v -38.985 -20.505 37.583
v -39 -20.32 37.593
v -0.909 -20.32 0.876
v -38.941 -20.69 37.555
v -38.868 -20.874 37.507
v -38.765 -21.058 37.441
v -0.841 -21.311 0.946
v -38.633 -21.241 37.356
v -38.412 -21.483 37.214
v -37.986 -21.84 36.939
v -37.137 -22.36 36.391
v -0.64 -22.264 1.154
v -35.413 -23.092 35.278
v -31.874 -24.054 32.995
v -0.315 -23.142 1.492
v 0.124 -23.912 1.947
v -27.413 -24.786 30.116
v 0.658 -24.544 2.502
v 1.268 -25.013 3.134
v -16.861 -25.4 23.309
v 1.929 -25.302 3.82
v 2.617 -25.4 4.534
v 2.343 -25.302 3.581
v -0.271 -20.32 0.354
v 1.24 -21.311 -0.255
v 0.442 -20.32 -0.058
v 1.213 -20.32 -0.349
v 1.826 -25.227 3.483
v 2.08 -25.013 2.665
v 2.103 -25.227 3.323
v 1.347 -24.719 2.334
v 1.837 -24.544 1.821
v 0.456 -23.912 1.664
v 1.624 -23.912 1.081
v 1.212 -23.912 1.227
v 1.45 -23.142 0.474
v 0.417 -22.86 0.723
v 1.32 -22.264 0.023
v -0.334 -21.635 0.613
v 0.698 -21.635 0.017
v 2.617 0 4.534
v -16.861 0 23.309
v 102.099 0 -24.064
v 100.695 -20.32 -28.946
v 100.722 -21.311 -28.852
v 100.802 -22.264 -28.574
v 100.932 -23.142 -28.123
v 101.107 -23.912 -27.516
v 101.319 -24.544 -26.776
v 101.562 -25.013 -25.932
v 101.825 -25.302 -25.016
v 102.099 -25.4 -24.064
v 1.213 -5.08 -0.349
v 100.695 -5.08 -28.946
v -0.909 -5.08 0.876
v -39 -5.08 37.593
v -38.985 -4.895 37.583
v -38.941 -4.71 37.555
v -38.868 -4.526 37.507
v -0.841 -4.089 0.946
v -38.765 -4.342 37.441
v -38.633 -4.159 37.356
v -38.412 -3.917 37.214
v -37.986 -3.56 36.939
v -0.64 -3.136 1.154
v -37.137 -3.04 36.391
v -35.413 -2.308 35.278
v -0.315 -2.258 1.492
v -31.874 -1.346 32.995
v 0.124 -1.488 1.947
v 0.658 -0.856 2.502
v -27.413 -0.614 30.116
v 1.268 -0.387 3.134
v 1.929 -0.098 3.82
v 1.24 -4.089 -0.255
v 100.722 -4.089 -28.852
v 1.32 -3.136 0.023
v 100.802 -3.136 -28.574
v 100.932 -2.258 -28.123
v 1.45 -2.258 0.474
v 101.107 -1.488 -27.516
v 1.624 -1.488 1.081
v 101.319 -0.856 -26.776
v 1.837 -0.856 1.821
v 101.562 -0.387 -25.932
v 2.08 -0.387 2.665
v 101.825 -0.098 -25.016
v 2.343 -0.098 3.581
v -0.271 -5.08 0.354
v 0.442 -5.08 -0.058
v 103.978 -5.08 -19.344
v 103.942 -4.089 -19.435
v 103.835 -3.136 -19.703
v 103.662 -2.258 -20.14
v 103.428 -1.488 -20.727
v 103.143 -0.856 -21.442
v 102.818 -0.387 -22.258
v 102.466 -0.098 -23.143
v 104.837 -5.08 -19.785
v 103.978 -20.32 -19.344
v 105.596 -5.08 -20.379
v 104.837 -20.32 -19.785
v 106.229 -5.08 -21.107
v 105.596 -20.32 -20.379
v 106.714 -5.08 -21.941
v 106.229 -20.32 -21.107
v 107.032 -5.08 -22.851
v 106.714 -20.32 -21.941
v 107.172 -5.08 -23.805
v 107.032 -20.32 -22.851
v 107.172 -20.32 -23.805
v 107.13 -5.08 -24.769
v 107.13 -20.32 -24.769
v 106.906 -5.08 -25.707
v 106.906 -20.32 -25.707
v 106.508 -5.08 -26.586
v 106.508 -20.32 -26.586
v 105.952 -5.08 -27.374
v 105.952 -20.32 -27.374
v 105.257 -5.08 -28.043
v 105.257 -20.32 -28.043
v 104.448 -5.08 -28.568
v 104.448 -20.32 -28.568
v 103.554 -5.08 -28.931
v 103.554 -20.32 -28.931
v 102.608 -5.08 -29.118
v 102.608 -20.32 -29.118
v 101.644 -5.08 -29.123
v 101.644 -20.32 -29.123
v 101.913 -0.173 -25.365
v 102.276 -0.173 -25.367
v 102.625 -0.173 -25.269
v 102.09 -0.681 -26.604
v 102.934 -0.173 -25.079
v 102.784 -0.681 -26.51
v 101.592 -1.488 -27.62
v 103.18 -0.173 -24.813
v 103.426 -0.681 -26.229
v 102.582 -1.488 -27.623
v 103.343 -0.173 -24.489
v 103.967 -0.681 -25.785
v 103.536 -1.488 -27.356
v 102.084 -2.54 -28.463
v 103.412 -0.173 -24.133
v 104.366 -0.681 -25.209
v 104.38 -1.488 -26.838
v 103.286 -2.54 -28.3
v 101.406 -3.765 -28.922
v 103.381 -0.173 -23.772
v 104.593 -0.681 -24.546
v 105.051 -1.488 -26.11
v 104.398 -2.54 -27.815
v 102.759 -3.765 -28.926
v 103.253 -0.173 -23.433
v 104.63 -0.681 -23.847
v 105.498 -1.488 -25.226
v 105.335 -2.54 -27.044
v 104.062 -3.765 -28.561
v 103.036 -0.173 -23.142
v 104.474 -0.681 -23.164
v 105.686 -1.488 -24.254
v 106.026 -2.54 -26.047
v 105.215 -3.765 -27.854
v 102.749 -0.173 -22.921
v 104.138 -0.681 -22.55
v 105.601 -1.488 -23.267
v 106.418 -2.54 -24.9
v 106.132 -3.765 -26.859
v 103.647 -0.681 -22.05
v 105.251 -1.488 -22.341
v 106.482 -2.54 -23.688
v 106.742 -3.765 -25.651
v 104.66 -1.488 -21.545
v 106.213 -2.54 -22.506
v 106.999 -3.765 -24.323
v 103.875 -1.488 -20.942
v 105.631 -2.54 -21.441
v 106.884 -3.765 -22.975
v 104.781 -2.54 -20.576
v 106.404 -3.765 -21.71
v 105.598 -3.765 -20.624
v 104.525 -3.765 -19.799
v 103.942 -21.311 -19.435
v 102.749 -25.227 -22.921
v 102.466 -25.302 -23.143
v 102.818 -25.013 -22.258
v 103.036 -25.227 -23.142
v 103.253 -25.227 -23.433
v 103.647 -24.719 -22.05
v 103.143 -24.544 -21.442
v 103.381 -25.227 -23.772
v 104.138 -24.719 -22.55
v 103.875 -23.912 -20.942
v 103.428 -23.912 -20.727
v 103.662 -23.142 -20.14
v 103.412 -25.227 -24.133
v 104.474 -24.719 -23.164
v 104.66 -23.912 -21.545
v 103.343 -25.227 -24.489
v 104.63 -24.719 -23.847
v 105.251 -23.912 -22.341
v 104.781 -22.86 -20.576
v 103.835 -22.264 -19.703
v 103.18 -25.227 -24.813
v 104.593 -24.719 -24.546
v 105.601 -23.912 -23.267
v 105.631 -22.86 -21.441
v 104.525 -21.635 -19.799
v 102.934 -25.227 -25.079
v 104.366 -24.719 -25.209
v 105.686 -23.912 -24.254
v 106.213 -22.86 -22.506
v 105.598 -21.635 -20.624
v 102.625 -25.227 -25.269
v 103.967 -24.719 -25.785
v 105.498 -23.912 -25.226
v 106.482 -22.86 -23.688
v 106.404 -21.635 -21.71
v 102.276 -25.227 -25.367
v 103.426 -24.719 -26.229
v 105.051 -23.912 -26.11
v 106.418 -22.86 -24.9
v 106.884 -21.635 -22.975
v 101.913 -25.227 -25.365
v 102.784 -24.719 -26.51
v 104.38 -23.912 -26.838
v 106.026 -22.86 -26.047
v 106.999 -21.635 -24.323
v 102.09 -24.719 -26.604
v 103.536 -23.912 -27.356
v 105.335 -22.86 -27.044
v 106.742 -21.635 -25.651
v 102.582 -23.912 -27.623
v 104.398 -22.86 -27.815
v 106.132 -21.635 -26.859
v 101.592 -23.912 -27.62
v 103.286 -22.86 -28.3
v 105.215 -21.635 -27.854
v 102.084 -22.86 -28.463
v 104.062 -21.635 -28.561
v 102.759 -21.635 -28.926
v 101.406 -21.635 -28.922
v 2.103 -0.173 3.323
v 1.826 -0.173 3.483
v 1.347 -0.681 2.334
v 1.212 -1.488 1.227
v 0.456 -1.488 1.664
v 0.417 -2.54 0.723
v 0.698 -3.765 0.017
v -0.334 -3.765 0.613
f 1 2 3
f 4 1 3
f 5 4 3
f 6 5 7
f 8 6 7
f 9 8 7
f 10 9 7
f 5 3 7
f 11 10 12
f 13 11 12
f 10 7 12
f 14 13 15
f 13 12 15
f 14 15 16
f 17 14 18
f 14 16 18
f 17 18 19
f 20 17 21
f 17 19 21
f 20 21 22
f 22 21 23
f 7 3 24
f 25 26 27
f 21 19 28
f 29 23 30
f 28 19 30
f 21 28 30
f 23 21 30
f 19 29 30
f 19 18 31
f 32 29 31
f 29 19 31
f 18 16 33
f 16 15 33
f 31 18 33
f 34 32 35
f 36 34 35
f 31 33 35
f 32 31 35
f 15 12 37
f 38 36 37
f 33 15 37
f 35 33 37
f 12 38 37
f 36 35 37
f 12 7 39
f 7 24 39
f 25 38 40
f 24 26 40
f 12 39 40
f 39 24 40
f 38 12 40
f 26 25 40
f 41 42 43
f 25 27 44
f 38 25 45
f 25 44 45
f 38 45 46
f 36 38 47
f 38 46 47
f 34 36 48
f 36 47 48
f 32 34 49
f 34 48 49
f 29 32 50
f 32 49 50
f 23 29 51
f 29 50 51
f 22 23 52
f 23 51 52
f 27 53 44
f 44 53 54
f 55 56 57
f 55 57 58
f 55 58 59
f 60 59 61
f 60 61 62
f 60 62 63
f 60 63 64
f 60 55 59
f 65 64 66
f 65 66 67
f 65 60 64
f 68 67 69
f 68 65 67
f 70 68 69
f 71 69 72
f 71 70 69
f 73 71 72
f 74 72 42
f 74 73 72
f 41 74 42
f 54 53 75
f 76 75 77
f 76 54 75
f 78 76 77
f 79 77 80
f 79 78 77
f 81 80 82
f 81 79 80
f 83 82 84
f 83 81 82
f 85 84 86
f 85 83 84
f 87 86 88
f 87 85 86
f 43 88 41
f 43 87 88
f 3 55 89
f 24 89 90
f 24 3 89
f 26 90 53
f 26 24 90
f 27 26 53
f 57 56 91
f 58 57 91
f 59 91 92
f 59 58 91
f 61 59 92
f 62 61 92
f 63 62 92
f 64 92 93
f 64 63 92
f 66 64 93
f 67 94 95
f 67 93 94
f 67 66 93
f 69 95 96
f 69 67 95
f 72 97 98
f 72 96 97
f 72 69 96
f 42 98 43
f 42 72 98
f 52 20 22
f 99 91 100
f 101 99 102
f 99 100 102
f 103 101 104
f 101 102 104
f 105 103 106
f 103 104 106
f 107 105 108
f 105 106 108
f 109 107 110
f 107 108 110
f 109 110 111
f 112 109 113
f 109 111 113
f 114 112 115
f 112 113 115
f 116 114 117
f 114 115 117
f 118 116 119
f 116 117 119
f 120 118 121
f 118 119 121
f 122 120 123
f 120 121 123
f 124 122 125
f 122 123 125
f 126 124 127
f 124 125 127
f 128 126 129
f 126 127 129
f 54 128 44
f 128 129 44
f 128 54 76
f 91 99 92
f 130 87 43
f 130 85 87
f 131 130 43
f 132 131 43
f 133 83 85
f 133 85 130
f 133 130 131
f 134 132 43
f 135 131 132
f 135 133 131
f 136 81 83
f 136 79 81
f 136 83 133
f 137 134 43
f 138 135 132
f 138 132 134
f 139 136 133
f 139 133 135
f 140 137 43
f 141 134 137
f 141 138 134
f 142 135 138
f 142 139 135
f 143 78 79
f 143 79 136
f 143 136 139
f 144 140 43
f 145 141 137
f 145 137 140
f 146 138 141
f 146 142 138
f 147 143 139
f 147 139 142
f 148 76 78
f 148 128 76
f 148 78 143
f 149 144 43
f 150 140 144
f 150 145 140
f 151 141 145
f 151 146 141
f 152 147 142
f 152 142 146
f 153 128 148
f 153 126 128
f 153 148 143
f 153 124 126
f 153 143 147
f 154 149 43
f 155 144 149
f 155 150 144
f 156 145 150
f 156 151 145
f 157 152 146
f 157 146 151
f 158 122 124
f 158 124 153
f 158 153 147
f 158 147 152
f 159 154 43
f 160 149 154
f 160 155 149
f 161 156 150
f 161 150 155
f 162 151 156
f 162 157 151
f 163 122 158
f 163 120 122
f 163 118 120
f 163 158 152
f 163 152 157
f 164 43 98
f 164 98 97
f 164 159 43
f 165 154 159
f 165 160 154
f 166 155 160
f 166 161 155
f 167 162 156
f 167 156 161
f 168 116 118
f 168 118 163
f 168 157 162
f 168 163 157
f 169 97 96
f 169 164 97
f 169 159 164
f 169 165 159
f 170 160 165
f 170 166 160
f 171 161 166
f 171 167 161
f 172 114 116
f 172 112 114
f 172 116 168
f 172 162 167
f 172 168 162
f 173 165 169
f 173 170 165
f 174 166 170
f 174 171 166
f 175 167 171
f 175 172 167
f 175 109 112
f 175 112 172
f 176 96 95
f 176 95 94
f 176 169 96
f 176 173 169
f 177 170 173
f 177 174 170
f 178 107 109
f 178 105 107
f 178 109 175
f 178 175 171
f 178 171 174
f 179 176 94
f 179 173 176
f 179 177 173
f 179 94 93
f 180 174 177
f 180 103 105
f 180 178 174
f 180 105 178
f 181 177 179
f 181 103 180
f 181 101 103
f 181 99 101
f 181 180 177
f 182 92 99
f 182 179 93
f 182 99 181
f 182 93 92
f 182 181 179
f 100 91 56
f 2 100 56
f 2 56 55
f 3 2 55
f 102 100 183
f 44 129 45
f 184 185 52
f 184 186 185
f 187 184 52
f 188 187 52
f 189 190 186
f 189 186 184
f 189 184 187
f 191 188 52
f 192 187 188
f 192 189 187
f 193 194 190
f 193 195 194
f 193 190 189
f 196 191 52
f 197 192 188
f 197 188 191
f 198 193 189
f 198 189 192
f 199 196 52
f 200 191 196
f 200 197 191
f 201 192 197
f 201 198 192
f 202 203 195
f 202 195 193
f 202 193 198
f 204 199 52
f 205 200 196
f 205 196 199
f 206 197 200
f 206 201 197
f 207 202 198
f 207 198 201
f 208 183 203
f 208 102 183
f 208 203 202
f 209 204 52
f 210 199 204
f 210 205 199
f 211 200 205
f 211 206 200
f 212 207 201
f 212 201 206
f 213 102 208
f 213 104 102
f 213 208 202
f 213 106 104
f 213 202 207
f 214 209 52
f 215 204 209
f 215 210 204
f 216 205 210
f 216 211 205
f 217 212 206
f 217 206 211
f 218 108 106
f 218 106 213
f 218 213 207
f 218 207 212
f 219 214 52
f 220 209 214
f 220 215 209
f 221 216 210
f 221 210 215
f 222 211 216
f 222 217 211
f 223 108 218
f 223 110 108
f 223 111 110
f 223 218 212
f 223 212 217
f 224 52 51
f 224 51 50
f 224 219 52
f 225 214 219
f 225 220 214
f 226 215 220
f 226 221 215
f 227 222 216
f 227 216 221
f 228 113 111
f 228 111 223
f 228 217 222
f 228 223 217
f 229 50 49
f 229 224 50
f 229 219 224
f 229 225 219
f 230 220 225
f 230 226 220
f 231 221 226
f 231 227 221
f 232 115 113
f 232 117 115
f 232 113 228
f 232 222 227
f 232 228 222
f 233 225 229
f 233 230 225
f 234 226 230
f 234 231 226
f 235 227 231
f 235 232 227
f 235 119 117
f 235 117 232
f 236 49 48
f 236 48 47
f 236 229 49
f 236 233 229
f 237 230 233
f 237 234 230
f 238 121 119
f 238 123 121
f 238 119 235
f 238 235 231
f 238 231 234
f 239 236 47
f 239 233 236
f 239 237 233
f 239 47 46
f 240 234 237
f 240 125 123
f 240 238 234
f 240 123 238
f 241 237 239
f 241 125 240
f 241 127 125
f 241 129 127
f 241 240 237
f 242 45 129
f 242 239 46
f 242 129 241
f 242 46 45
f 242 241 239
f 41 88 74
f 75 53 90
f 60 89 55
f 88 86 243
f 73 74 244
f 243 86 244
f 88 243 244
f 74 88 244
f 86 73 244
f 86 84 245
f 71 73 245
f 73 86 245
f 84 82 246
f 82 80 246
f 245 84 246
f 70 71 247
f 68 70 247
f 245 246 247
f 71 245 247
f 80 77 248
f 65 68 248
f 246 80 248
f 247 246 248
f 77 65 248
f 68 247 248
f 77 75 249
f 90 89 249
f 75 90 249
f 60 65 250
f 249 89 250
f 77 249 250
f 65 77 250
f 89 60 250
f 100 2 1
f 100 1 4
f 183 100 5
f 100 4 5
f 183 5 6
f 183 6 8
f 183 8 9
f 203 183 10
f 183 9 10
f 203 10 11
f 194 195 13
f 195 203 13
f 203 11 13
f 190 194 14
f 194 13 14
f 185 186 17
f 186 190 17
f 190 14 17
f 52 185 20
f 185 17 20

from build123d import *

# Parameters (mm, degrees)
F1_DEPTH = 25.4
F3_R     = 5.08


# Not quite as in the source:
# - a feature of the source that left no trace in its solid (it failed there, or was rolled back) is left out


with BuildPart() as f1:
    # F0 (on Front) → F1 (new body)
    with BuildSketch(Plane.XZ):
        Polygon((199.189722538, -57.2593323886), (-38.9998517931, 37.592638284), (0, 0), align=None)
    extrude(amount=F1_DEPTH)

    # F3
    f3_edges = [f1.edges().sort_by_distance(p)[0] for p in [
        (80.094935, -25.4, -9.833347),
        (-19.499926, -25.4, 18.796319),
        (99.594861, -25.4, -28.629666),
        (0, -12.7, 0),
        (199.189723, -12.7, -57.259332),
        (99.594861, 0, -28.629666),
        (80.094935, 0, -9.833347),
        (-19.499926, 0, 18.796319),
    ]]
    fillet(f3_edges, radius=F3_R)


solid = f1.part
